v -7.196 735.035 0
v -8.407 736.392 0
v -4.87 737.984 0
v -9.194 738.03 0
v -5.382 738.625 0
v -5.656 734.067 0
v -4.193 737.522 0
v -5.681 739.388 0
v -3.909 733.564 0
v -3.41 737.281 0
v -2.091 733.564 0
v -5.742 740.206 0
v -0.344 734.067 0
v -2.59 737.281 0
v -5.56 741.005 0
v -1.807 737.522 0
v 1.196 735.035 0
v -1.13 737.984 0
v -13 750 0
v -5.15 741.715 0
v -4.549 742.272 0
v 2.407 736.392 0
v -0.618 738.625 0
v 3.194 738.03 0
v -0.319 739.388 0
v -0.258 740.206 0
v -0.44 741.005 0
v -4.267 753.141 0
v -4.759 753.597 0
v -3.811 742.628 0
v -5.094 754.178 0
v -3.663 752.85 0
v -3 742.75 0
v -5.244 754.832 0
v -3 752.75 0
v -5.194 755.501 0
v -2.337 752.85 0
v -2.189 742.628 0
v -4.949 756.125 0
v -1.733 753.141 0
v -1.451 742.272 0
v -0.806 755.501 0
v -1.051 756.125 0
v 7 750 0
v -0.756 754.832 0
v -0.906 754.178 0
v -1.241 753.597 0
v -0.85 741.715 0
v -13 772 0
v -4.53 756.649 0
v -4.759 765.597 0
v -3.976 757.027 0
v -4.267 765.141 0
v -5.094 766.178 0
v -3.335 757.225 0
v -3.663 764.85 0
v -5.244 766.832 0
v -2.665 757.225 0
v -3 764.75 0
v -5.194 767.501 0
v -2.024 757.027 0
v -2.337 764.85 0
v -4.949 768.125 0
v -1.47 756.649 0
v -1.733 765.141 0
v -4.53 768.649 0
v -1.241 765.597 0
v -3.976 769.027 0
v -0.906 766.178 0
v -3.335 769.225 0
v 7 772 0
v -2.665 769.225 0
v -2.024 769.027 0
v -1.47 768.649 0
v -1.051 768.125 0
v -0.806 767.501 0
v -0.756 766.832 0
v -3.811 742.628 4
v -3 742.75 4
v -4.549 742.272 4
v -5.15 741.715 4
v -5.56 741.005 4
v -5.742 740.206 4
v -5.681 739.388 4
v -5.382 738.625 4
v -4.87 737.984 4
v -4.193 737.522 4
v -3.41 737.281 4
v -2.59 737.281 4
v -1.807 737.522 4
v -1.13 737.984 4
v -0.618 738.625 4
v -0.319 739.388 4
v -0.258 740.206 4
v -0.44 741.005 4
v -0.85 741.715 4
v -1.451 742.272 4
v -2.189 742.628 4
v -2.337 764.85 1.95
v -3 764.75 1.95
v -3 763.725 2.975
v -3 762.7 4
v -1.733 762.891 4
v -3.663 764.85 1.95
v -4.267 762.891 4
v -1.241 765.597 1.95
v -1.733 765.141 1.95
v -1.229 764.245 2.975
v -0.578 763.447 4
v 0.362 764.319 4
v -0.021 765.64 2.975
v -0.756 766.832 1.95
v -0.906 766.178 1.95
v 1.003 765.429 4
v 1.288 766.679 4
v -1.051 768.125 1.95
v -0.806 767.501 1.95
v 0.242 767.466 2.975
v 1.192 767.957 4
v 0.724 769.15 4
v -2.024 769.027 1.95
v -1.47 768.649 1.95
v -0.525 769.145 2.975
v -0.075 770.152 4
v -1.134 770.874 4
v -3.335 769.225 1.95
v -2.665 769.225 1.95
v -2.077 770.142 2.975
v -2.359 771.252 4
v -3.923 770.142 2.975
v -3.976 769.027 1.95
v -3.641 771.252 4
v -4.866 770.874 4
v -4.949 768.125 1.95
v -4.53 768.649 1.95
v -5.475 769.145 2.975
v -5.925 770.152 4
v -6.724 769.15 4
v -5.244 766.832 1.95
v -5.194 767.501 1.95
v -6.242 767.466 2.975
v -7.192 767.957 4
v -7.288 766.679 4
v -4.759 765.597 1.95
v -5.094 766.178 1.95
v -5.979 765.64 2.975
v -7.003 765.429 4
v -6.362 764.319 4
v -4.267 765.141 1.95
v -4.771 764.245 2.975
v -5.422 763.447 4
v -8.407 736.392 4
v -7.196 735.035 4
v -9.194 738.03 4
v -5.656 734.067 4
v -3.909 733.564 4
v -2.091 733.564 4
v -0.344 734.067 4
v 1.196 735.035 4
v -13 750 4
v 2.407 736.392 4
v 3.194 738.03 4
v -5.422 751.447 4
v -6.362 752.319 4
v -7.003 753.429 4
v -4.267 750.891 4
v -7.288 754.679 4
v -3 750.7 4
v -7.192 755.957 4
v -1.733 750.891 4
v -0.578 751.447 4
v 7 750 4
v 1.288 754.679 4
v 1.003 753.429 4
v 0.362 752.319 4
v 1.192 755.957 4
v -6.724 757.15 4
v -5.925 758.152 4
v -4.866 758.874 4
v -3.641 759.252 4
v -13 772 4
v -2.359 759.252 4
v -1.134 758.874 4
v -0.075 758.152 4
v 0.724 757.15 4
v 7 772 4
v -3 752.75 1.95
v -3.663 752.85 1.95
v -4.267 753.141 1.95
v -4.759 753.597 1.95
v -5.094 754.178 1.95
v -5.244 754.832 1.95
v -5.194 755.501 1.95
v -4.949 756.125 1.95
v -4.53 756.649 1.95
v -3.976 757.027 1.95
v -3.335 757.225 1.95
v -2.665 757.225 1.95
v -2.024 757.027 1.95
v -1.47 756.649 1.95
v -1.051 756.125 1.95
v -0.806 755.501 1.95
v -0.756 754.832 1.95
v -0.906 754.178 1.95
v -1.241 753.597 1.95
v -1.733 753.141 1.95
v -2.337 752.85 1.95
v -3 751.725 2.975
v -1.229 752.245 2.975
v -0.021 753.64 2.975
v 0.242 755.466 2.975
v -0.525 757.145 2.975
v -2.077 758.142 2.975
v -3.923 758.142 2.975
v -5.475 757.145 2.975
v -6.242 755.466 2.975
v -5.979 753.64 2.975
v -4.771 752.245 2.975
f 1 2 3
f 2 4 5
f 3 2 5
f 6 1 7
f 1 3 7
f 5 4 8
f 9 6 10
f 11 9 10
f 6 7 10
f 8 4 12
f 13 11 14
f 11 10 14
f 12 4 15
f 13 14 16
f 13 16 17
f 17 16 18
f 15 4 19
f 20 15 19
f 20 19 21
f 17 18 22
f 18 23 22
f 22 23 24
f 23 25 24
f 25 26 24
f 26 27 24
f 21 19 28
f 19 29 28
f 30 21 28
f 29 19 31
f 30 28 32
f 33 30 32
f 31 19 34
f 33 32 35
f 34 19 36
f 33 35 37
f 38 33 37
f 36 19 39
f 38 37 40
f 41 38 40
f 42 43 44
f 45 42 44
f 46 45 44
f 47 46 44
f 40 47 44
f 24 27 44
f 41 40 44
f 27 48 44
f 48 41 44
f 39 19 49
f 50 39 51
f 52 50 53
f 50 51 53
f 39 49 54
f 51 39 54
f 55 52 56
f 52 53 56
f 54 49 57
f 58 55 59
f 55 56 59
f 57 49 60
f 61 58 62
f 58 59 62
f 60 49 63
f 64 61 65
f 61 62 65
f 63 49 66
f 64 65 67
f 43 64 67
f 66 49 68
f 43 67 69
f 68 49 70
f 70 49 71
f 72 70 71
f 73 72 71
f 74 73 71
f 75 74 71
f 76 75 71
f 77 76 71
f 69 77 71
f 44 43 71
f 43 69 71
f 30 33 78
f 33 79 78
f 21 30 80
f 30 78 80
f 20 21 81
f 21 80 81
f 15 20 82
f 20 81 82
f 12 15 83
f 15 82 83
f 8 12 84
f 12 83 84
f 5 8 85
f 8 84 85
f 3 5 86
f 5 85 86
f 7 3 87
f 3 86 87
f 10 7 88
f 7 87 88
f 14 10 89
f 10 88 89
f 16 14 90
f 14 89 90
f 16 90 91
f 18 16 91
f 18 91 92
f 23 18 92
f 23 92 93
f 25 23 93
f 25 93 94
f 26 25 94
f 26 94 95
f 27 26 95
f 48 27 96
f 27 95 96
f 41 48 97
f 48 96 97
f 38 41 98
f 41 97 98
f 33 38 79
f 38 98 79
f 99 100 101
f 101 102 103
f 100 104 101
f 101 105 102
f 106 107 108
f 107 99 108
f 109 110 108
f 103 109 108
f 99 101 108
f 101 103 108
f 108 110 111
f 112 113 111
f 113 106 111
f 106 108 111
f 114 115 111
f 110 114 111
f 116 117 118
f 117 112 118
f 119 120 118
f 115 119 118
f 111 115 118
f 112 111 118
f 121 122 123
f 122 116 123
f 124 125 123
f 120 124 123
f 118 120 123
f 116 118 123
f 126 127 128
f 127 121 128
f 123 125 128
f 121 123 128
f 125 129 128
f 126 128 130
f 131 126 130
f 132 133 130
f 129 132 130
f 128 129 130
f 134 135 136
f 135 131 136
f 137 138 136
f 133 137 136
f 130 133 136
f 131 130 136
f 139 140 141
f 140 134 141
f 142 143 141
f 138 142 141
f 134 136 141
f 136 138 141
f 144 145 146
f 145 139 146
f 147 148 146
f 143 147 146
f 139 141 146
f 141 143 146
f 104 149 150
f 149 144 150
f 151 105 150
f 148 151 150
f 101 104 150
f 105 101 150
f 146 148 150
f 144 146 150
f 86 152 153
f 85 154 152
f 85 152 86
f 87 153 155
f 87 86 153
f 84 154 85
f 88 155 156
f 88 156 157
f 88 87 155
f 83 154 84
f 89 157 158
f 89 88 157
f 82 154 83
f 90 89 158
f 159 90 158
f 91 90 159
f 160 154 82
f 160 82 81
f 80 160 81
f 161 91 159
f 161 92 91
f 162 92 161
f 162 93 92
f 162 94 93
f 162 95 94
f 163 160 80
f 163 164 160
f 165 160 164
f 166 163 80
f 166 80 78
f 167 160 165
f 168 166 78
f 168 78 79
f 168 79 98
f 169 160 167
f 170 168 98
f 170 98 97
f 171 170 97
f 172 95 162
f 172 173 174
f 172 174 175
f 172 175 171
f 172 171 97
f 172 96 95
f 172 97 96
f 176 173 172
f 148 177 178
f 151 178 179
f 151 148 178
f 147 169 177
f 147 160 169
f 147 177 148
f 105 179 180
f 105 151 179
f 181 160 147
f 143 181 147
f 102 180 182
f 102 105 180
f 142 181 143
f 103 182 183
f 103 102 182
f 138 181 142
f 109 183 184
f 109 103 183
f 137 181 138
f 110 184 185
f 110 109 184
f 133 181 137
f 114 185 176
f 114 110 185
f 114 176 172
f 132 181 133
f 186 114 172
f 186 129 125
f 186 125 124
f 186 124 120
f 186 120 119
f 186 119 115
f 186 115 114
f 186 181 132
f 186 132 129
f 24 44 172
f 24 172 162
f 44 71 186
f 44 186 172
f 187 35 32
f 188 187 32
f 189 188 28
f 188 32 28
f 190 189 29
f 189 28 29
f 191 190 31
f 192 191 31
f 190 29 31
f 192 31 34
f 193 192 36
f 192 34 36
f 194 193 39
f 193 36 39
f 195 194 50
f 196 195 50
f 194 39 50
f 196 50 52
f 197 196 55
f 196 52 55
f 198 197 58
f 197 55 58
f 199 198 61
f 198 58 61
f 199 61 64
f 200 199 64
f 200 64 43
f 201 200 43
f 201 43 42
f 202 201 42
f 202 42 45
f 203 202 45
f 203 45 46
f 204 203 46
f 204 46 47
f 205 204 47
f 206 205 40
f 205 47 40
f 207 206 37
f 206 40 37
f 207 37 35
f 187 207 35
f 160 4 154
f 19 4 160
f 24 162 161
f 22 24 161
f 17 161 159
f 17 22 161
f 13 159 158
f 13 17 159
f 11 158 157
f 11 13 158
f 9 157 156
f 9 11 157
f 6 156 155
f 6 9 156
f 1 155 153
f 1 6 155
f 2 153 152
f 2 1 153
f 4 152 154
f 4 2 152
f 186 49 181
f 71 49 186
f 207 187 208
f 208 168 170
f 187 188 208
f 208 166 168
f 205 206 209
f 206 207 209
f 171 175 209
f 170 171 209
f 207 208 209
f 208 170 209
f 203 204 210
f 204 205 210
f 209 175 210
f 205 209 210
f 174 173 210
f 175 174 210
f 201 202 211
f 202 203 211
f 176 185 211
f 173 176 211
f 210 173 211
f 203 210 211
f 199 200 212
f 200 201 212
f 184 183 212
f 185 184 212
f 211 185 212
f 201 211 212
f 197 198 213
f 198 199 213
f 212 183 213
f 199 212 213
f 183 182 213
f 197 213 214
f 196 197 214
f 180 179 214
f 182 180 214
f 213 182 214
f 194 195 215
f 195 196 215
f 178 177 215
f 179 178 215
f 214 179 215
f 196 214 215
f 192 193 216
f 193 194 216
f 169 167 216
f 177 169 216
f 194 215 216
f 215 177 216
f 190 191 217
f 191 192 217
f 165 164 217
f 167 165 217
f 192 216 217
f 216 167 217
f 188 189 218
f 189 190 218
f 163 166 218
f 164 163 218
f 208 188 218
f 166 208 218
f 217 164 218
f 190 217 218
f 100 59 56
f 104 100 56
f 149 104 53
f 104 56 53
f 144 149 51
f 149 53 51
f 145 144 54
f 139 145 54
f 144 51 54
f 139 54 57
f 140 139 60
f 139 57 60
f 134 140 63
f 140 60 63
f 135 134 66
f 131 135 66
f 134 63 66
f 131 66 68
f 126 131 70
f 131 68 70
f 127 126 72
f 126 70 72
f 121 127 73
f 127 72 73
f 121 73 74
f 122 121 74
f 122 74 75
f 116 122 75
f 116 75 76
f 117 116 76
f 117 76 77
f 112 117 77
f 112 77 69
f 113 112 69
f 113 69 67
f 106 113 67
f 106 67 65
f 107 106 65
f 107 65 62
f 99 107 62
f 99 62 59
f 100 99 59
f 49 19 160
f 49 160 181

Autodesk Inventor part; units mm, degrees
ref_plane "YZ Plane" through (0, 0, 0) normal (1, 0, 0) x (0, 1, 0)
ref_plane "XZ Plane" through (0, 0, 0) normal (0, 1, 0) x (-1, 0, 0)
ref_plane "XY Plane" through (0, 0, 0) normal (0, 0, 1) x (1, 0, 0)
ref_plane "Work Plane1" through (0, 0, 0) normal (0, 0, 1) x (1, 0, 0)
sketch "Sketch1" plane through (0, 0, 0) normal (0, 0, 1) x (1, 0, 0)
  circle A0 centre (-3, 740) radius 5.2 projected
  circle A1 centre (-3, 767) radius 4.3 projected
  circle A2 centre (-3, 755) radius 4.3 projected
  line L0 (7, 772) -> (7, 750) projected
  line L1 (7, 750) -> (3.1945, 738.0305) projected
  arc A3 (-9.1945, 738.0305) -> (3.1945, 738.0305) centre (-3, 740) ccw projected
  line L2 (-9.1945, 738.0305) -> (-13, 750) projected
  line L3 (-13, 750) -> (-13, 772) projected
  line L4 (-13, 772) -> (7, 772) projected
  point P0 (0, 0)
extrude "Extrusion1" add sketch "Sketch1" along normal blind 4 contours A0 | A1 | A2 | L0 L1 A3 L2 L3 L4
hole "Hole1" at (-3, 740, 0) direction (0, 0, 1) diameter 5.5 end through all clearance for "Countersunk Head GOST 12876-67" size "M5" standard "GOST"
sketch "Sketch2" plane through (0, 0, 4) normal (0, 0, 1) x (1, 0, 0)
  circle A0 centre (-3, 740) radius 5.2 projected
  circle A1 centre (-3, 767) radius 4.3 projected
  circle A2 centre (-3, 755) radius 4.3 projected
  line L0 (7, 772) -> (7, 750) projected
  line L1 (7, 750) -> (3.1945, 738.0305) projected
  arc A3 (-9.1945, 738.0305) -> (3.1945, 738.0305) centre (-3, 740) ccw projected
  line L2 (-9.1945, 738.0305) -> (-13, 750) projected
  line L3 (-13, 750) -> (-13, 772) projected
  line L4 (-13, 772) -> (7, 772) projected
  point P0 (0, 0)
hole "Hole2" at (-3, 767, 4) at (-3, 755, 4) direction (0, 0, -1) diameter 4.5 end through all countersink diameter 8.6 countersink angle 90 clearance for "Countersunk Head GOST 12876-67" size "M4" standard "GOST"
properties part number "belt_tentioner_2"
